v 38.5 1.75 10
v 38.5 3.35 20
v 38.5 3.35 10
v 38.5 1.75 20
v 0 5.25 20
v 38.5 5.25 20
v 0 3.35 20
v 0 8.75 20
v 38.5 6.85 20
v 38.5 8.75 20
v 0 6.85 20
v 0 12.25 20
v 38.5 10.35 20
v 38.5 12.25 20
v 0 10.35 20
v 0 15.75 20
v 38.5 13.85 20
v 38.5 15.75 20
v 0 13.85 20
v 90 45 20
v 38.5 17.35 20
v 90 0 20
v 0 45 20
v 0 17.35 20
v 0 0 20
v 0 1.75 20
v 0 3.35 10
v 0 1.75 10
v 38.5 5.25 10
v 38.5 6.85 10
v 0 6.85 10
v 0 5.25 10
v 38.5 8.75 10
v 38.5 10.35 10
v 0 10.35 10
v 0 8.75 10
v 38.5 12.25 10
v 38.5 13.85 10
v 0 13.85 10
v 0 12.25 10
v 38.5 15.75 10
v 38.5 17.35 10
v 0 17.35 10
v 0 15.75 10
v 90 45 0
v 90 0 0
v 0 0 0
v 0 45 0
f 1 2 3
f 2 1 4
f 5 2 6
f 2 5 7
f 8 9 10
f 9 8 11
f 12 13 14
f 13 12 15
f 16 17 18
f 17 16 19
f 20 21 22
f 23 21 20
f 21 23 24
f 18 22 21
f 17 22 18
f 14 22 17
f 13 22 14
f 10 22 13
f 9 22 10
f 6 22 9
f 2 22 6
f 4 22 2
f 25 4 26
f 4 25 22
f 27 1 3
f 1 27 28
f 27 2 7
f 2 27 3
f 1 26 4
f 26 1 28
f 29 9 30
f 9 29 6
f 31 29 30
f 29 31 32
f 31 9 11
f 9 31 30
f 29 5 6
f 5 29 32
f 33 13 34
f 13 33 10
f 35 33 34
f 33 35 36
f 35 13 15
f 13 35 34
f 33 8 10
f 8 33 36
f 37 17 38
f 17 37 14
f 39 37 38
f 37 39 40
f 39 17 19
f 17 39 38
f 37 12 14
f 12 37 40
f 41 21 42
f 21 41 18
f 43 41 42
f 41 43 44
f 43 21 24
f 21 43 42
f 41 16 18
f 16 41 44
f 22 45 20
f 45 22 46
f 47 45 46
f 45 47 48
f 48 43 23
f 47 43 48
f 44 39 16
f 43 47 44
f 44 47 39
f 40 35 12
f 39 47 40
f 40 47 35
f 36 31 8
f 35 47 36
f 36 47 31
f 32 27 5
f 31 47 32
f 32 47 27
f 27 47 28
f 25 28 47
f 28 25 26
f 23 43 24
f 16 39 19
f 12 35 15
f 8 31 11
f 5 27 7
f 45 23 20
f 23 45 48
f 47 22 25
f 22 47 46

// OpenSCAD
// Drying Rack for 10 Microscope Slides
// Base: 90 x 45 x 20 mm
// Slots: 10 parallel slots, 77mm long, 1.6mm wide, 10mm deep
// Spacing: 3.5mm centre-to-centre (Y)

$fn = 128; // High resolution for smooth slot edges

// Base Dimensions
base_length = 90;  // X
base_width = 45;   // Y
base_height = 20;  // Z

// Slide Dimensions (for reference)
slide_length = 75;
slide_width = 25;
slide_thickness = 1;

// Slot Dimensions
slot_length = 77;  // X
slot_width = 1.6;  // Y
slot_depth = 10;   // Z (cut depth)

// Layout
num_slots = 10;
slot_spacing = 3.5; // Centre-to-centre in Y

// Calculate Y position of the first slot centre
// Total width occupied by slots + gaps
// We need to center the whole group in Y (base_width / 2)
// The group spans from the first slot centre minus (num_slots-1)/2 * spacing to the last
// Actually, simpler: The group of centres is symmetric around 0.
// First slot centre = - ( (num_slots - 1) * slot_spacing ) / 2
first_slot_y = -((num_slots - 1) * slot_spacing) / 2;

// Generate the main block
difference() {
    // 1. Create the solid base block
    translate([0, 0, 0])
    cube([base_length, base_width, base_height]);

    // 2. Cut the 10 slots
    // Slots run along X, so we cut a long rectangular prism from the top face downwards
    for (i = [0 : num_slots - 1]) {
        // Calculate Y position for this specific slot
        current_y = first_slot_y + (i * slot_spacing);
        
        // Define the cutting volume
        // The slot is open at the top (Z=base_height) and goes down to Z = base_height - slot_depth
        // It runs the full length of the slot (slot_length) centered in X
        // It has width slot_width centered in Y
        
        translate([
            -slot_length / 2, 
            current_y, 
            base_height - slot_depth
        ])
        cube([
            slot_length, 
            slot_width, 
            slot_depth
        ]);
    }
}
